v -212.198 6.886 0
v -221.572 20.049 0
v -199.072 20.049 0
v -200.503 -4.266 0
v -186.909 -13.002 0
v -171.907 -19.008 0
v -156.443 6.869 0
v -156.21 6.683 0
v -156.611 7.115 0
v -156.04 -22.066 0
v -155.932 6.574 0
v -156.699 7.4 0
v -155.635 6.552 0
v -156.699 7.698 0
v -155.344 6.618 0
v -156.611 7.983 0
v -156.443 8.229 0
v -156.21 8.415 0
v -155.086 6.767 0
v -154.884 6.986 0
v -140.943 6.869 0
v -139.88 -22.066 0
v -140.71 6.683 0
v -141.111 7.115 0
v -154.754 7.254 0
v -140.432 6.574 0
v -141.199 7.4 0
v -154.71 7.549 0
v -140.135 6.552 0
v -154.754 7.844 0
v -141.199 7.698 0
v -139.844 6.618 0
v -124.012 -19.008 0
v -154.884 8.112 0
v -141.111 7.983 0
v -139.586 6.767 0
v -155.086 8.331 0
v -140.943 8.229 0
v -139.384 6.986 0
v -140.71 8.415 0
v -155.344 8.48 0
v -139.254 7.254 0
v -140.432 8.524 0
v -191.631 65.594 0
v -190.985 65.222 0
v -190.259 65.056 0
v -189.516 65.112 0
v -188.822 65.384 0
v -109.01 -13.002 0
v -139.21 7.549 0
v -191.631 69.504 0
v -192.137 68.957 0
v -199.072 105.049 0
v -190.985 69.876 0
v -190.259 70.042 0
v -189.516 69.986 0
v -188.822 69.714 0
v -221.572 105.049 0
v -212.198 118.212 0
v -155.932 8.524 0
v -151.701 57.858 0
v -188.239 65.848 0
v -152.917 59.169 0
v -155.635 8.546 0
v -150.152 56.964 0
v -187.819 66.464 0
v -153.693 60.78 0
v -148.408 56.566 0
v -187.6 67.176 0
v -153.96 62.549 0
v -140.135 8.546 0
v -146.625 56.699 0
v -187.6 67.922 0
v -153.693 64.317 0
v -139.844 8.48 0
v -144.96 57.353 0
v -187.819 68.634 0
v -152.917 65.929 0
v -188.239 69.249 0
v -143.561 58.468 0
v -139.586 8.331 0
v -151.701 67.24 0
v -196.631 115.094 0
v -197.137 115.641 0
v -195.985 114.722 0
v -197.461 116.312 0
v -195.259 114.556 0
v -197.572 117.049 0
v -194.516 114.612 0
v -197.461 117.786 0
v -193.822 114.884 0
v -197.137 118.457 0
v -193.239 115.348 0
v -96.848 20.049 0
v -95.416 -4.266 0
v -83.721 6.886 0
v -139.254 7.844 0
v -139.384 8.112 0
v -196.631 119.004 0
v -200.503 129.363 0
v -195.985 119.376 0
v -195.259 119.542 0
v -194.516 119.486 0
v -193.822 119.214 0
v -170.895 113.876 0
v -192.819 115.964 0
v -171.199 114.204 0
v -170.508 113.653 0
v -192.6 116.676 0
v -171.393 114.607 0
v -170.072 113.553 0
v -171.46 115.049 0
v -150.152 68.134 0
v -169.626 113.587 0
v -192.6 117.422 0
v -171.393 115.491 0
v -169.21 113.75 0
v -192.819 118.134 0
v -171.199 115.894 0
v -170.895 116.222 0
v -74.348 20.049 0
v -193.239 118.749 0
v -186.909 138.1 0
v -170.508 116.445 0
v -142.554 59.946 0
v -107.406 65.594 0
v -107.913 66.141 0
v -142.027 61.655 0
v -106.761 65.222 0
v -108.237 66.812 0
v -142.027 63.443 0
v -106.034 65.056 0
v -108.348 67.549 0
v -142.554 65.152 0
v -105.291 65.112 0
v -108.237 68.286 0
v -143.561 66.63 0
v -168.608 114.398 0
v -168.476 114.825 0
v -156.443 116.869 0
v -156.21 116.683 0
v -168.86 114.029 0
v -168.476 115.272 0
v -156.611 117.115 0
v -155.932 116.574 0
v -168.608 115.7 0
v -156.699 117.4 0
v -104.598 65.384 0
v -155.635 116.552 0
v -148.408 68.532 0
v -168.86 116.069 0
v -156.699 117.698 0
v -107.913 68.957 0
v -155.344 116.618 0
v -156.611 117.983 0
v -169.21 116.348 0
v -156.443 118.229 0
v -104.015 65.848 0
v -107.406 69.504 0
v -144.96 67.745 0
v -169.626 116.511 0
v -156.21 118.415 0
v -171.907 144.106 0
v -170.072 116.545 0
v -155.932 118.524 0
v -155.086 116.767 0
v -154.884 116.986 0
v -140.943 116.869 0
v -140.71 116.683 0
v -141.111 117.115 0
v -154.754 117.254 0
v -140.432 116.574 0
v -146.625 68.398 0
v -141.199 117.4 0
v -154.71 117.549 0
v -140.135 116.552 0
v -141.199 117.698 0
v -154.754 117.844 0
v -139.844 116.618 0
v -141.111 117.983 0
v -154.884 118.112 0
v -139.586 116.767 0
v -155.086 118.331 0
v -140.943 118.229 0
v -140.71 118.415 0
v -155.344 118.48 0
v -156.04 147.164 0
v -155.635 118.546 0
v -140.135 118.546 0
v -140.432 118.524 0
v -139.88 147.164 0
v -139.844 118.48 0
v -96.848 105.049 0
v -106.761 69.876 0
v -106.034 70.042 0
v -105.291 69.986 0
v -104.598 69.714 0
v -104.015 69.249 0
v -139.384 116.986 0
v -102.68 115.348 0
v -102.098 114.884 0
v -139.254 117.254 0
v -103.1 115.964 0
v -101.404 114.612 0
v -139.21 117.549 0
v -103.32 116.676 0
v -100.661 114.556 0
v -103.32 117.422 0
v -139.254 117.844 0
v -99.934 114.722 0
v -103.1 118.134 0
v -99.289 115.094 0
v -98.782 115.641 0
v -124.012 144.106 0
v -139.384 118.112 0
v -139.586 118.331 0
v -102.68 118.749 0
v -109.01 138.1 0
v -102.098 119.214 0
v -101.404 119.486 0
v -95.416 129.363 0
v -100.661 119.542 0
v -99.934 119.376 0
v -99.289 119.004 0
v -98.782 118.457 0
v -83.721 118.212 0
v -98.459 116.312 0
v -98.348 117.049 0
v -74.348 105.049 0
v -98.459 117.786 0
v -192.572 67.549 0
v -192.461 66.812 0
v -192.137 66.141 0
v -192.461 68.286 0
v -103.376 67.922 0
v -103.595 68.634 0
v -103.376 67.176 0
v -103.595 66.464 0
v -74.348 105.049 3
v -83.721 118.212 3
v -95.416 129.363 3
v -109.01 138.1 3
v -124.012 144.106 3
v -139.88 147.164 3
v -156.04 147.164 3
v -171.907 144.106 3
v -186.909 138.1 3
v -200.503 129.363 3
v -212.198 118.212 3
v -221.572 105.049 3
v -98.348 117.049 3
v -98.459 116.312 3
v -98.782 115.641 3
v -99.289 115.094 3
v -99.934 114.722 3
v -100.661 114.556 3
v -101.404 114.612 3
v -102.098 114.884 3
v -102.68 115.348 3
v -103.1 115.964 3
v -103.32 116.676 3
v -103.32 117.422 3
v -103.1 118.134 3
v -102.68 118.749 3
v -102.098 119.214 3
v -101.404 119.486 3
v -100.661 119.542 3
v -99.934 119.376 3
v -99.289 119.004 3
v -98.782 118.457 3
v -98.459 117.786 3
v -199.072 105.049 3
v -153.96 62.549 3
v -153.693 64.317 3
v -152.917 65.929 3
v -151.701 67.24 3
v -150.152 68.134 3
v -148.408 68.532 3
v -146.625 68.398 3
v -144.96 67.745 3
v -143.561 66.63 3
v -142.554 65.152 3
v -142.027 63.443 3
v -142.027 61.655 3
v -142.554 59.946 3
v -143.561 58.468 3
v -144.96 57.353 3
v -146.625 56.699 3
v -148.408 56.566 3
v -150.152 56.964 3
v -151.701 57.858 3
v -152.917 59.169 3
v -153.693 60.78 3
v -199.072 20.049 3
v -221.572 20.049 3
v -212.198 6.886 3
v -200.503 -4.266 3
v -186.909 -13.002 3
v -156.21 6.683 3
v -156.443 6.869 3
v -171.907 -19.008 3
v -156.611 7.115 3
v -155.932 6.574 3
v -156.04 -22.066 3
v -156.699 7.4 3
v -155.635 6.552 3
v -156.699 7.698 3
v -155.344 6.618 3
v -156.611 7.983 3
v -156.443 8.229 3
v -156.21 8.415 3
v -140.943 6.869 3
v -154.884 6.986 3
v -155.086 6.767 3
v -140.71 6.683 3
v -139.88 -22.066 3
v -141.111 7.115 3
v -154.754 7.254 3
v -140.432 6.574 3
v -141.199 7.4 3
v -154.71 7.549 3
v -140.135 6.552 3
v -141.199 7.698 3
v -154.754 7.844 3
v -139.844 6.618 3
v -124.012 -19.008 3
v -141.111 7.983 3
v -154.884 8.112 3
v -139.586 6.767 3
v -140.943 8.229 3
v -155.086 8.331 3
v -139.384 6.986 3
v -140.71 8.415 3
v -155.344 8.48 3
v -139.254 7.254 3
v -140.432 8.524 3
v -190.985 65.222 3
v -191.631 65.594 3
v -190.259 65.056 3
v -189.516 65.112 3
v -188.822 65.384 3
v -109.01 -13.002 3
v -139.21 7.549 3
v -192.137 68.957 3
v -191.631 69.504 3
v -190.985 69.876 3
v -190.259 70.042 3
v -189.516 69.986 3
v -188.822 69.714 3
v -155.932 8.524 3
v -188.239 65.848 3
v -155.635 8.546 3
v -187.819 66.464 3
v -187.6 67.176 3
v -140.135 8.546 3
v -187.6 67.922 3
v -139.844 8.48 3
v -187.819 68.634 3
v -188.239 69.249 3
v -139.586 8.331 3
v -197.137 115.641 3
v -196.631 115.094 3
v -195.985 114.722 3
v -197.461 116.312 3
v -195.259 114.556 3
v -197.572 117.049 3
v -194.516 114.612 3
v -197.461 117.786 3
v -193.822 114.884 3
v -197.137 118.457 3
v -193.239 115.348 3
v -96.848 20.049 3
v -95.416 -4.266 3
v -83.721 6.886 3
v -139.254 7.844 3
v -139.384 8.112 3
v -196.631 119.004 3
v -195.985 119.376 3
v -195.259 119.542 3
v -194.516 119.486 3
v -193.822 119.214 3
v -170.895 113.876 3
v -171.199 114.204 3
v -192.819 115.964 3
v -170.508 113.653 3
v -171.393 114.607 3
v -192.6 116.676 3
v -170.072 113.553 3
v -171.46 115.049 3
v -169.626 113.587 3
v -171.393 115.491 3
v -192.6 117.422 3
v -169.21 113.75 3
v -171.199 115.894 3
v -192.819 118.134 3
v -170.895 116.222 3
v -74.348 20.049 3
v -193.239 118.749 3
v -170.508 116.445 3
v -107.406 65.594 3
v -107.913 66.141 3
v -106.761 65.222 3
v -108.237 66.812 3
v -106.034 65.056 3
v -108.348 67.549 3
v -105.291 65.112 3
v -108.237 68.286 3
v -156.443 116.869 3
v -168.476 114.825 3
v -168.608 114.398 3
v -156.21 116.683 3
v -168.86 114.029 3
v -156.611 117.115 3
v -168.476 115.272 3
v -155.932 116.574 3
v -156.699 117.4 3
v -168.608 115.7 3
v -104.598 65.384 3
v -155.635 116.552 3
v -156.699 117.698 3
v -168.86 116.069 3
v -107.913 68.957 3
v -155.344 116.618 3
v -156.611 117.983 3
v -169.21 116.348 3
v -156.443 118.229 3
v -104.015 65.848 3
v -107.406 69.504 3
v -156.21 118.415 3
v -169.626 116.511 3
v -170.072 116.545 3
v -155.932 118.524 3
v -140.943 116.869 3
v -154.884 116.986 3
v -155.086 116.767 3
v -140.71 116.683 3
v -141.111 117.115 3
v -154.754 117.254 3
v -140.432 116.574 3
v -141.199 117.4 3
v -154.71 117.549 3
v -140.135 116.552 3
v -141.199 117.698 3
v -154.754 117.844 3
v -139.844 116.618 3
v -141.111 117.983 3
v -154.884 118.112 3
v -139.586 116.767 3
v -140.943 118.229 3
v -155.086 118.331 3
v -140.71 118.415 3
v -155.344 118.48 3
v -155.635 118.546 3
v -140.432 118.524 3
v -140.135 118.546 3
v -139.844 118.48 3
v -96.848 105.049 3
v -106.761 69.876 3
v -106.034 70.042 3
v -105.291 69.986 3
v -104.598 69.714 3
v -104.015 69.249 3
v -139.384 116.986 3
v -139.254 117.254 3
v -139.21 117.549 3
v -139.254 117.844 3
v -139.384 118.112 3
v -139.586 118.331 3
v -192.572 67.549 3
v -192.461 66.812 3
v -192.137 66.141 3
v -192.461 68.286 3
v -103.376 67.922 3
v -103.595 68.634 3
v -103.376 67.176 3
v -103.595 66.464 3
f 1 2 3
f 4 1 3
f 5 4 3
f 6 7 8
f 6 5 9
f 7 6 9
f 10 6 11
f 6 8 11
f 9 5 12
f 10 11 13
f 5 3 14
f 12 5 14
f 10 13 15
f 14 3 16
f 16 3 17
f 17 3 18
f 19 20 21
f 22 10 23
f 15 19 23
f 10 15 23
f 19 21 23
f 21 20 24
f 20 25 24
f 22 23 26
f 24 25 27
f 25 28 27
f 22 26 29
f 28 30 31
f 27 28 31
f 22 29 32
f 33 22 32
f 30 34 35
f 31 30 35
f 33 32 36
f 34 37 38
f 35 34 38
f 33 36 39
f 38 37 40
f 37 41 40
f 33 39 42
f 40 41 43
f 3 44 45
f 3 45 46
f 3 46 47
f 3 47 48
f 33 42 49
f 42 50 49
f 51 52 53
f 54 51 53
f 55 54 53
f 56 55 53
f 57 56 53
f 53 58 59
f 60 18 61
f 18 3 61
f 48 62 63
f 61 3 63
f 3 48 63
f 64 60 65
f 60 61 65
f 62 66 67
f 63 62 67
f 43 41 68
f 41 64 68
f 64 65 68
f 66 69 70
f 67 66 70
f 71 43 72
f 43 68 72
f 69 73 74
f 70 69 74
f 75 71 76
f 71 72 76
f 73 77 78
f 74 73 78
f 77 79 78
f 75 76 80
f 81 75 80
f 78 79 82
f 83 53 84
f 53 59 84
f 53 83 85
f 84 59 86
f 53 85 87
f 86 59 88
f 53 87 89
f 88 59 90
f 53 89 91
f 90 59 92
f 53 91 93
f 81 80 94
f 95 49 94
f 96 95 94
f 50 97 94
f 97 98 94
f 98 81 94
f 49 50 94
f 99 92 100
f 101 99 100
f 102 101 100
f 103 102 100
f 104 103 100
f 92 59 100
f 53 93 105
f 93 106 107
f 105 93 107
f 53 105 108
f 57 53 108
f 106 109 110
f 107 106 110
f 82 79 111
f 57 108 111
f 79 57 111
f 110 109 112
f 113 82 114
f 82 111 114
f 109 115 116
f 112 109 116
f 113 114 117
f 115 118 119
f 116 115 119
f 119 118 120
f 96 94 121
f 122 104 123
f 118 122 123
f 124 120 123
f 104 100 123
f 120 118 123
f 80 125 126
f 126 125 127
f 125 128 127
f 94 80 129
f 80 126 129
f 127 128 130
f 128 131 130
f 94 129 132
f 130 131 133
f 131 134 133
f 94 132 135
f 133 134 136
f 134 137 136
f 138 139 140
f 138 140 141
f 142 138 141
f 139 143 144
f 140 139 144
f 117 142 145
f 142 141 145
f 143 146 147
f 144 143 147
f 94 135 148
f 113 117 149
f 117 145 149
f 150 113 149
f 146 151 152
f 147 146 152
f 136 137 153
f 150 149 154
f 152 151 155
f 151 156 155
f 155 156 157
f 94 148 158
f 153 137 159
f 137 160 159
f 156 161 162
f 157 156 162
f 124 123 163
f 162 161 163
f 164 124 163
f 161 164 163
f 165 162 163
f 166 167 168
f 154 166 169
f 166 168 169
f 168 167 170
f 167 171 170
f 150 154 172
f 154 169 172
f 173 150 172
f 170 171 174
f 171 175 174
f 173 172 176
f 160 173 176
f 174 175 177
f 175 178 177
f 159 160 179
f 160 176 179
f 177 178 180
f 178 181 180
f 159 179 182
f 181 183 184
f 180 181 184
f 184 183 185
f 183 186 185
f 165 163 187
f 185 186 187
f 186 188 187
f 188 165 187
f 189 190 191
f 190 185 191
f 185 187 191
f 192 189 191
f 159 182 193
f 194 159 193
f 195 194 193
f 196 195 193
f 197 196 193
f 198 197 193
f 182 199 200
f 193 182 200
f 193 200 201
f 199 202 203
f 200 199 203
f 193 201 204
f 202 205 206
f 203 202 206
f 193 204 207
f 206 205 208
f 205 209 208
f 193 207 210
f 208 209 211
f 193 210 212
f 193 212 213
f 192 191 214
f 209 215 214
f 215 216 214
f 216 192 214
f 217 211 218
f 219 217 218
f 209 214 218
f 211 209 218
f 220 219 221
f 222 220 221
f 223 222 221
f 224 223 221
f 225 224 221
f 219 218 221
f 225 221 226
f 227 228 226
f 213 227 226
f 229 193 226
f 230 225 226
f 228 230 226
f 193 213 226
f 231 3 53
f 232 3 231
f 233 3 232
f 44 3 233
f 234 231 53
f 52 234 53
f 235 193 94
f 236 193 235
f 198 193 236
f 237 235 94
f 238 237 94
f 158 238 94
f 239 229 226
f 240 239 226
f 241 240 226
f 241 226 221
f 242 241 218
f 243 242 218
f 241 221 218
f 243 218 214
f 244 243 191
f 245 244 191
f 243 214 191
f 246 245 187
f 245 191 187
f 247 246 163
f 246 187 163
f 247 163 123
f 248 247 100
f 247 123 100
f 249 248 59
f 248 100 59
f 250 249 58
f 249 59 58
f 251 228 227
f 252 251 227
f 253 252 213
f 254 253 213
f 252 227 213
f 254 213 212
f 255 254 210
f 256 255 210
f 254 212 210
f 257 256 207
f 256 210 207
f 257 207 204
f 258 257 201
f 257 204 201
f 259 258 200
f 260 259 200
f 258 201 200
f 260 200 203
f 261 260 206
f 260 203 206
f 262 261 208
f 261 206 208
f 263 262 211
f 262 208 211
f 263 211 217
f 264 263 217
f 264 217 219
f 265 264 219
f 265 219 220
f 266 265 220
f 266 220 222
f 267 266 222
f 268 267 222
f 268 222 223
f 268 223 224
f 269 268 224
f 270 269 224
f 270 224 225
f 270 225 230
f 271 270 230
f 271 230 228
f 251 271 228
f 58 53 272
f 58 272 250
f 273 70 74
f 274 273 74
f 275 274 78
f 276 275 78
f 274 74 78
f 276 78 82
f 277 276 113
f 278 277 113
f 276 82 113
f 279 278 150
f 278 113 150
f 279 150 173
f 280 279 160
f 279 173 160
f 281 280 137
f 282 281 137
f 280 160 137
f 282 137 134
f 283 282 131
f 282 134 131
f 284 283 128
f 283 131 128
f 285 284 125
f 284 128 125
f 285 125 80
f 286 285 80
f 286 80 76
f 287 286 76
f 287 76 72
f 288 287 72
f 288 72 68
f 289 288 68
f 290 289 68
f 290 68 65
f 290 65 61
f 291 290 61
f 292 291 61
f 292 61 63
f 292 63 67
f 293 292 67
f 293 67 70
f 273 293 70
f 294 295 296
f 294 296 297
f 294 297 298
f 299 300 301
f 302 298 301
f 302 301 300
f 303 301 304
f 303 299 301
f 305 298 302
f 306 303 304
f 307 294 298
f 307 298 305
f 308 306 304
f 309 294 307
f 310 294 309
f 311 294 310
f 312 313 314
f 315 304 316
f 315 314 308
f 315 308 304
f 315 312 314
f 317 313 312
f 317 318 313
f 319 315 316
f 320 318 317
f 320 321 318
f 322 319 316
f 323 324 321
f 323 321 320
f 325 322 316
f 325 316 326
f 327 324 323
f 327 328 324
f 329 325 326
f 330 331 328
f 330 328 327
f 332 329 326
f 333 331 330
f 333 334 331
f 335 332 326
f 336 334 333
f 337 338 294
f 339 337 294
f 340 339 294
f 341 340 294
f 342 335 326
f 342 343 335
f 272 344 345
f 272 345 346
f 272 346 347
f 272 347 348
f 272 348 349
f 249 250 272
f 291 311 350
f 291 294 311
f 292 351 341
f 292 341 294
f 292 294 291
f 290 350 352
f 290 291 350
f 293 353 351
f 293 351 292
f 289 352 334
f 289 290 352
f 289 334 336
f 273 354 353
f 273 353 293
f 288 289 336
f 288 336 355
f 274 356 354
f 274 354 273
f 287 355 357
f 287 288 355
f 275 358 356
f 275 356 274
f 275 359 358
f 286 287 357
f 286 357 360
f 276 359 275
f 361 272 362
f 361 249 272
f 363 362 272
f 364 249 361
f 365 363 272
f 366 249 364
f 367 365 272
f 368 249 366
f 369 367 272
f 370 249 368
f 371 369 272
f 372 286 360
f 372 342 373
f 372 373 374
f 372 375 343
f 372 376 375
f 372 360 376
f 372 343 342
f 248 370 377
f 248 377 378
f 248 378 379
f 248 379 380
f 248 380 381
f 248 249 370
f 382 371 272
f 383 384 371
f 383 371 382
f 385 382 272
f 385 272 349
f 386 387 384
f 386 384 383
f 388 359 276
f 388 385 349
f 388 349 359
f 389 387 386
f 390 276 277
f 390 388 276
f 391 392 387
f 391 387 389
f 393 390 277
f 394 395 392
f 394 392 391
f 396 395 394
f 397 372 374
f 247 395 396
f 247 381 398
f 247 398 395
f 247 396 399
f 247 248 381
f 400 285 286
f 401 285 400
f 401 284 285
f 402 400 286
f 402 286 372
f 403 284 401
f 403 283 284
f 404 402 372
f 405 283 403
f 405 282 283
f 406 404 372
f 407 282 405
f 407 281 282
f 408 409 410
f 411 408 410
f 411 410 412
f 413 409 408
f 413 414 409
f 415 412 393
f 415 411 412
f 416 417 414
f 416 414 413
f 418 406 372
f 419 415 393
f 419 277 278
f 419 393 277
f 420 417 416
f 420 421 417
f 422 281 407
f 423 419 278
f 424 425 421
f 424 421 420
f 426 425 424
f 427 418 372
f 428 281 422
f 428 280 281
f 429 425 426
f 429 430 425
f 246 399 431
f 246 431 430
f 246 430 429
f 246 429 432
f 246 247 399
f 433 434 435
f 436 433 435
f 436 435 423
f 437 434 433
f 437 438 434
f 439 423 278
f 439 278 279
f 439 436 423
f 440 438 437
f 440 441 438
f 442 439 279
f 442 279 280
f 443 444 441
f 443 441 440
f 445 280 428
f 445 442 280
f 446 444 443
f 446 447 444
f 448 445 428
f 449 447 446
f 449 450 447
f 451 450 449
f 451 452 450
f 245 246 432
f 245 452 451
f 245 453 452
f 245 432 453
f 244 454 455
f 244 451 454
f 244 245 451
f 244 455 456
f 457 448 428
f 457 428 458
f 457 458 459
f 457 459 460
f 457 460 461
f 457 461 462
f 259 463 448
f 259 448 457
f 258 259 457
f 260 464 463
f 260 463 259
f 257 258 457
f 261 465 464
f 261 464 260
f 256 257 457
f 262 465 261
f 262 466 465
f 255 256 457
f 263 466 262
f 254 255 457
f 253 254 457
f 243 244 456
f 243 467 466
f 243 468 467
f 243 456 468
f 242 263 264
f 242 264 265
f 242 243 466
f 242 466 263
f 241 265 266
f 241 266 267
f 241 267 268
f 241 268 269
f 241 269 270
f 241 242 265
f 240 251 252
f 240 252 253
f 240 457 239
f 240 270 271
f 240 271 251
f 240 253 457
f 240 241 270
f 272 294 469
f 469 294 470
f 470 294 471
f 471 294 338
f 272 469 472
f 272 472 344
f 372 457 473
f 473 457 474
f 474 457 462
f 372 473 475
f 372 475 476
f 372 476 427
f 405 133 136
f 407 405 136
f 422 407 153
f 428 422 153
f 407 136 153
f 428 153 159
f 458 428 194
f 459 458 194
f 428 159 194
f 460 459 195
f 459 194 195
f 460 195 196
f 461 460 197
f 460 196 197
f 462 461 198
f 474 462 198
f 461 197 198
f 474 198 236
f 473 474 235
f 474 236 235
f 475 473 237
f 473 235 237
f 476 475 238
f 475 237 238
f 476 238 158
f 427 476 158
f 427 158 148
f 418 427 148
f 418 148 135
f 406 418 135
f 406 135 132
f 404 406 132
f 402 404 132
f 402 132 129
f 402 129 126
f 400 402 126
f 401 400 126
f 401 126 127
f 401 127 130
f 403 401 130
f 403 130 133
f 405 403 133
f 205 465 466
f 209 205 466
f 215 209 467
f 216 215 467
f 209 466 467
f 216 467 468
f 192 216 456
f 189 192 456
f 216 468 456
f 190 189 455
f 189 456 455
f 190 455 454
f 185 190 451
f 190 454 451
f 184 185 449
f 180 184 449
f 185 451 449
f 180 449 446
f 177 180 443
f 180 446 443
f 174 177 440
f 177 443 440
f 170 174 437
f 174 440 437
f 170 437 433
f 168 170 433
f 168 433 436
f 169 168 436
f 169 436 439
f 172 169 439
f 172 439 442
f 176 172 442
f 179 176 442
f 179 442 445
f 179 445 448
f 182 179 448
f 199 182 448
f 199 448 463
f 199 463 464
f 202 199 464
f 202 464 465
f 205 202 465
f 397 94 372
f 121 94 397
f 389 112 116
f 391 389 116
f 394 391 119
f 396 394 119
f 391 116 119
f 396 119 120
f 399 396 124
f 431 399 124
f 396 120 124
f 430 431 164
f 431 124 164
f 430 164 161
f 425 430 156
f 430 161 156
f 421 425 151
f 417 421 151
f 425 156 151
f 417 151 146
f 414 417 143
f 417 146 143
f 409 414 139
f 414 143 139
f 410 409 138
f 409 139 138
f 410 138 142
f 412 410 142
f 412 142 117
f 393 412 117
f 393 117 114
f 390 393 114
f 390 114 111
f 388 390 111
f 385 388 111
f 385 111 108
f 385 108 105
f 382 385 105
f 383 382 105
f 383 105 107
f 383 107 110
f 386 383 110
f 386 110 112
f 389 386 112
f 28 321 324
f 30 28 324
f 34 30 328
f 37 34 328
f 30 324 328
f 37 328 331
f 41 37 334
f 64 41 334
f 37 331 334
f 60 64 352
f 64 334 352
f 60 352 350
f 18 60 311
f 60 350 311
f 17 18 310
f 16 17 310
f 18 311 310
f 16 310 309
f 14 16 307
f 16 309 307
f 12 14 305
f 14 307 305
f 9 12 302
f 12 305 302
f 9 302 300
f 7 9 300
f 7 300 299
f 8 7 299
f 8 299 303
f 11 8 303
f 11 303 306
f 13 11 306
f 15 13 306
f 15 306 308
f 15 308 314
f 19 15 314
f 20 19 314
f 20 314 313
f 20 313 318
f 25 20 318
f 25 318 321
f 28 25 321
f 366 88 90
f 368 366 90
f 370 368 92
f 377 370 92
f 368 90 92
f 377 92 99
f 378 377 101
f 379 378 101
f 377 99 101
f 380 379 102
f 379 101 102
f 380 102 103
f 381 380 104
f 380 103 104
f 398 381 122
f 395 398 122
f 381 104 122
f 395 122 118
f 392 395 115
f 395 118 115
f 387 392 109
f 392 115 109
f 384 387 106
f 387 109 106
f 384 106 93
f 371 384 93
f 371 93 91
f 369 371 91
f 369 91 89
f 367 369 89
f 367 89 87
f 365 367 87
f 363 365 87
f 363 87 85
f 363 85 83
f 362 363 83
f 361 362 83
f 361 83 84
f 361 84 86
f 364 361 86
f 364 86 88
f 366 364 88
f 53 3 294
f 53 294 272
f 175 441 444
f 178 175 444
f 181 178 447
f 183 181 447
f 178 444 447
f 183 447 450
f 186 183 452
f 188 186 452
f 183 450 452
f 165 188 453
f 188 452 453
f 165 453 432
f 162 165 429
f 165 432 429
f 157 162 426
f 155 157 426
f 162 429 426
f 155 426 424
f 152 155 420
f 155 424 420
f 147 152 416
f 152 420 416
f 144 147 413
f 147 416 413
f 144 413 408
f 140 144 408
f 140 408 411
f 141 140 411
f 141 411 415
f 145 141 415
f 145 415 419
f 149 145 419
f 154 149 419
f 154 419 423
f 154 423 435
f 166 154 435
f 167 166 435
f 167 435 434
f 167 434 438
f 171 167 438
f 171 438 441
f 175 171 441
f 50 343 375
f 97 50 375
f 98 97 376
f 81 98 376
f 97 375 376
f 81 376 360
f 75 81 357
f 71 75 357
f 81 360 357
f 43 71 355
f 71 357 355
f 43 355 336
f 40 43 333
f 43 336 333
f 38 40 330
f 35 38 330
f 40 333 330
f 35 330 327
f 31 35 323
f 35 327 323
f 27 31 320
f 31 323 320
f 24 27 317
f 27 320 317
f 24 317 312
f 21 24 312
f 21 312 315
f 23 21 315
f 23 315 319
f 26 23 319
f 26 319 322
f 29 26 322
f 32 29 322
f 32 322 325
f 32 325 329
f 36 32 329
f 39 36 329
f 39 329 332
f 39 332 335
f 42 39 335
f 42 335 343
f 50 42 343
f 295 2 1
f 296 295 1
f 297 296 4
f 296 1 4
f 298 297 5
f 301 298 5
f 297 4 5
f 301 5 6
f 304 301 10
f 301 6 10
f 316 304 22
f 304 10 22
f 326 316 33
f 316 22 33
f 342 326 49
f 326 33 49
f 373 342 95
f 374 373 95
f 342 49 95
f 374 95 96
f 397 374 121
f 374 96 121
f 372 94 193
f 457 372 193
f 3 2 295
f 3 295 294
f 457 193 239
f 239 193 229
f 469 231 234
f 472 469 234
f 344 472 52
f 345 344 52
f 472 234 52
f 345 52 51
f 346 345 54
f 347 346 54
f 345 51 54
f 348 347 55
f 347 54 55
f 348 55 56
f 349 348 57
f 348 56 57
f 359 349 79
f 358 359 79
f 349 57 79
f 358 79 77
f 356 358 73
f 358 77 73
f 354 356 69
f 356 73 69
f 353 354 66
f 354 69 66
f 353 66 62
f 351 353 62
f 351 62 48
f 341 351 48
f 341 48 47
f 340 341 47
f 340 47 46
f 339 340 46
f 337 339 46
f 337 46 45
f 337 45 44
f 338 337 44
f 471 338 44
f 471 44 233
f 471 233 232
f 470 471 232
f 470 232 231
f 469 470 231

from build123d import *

# Parameters (mm, degrees)
ESQUISSE1_R              = 85
BOSS_EXTRU_1_DEPTH       = 3
ESQUISSE2_W              = 32.5
ESQUISSE2_H              = 85
ENL_V_MAT_EXTRU_6_DEPTH  = 3
ESQUISSE3_R              = 1
ENL_V_MAT_EXTRU_8_DEPTH  = 10
ESQUISSE53_R             = 2.5
ENL_V_MAT_EXTRU_21_DEPTH = 10
ESQUISSE54_R             = 2.5
ENL_V_MAT_EXTRU_22_DEPTH = 10
ESQUISSE55_R             = 1.5
ENL_V_MAT_EXTRU_23_DEPTH = 10
ESQUISSE56_R             = 6
ENL_V_MAT_EXTRU_24_DEPTH = 10


with BuildPart() as part:
    # Esquisse1 → Boss.-Extru.1 (new body)
    with BuildSketch(Plane.XY):
        with Locations((-147.95974357, 62.548931244)):
            Circle(ESQUISSE1_R)
    extrude(amount=BOSS_EXTRU_1_DEPTH)

    # Esquisse2 → Enlèv. mat.-Extru.6 (cut)
    with BuildSketch(Plane.XY):
        with BuildLine():
            Line((-199.071902892, 105.048931244), (-221.571902892, 105.048931244))
            ThreePointArc((-221.571902892, 105.048931244), (-227.739869981, 91.876928617), (-231.571902892, 77.846212492))
            Line((-231.571902892, 77.846212492), (-231.571902892, 47.251649997))
            ThreePointArc((-231.571902892, 47.251649997), (-227.739869981, 33.220933871), (-221.571902892, 20.048931244))
            Line((-221.571902892, 20.048931244), (-199.071902892, 20.048931244))
            Line((-199.071902892, 20.048931244), (-199.071902892, 105.048931244))
        make_face()
        with Locations((-80.597584249, 62.548931244)):
            Rectangle(ESQUISSE2_W, ESQUISSE2_H)
    extrude(amount=ENL_V_MAT_EXTRU_6_DEPTH, mode=Mode.SUBTRACT)


with BuildPart() as enl_v_mat_extru_6_piece_1:
    # of the separate pieces the step leaves, piece 1, a body of its own (enl_v_mat_extru_6_pieces)
    add(part.part.solids().sort_by_distance((-74.347584249, 105.048931244, 0))[0])

    # Esquisse3 → Enlèv. mat.-Extru.8 (cut)
    with BuildSketch(Plane.XY.offset(3)):
        with Locations((-155.70974357, 117.548931244)):
            Circle(ESQUISSE3_R)
        with Locations((-140.20974357, 117.548931244)):
            Circle(ESQUISSE3_R)
        with Locations((-140.20974357, 7.548931244)):
            Circle(ESQUISSE3_R)
        with Locations((-155.70974357, 7.548931244)):
            Circle(ESQUISSE3_R)
    extrude(amount=-ENL_V_MAT_EXTRU_8_DEPTH, mode=Mode.SUBTRACT)

    # Esquisse53 → Enlèv. mat.-Extru.21 (cut)
    with BuildSketch(Plane(origin=(0, 0, 0), x_dir=(-1, 0, 0), z_dir=(0, 0, -1))):
        with Locations((190.071902892, 67.548931244)):
            Circle(ESQUISSE53_R)
        with Locations((105.847584249, 67.548931244)):
            Circle(ESQUISSE53_R)
    extrude(amount=-ENL_V_MAT_EXTRU_21_DEPTH, mode=Mode.SUBTRACT)

    # Esquisse54 → Enlèv. mat.-Extru.22 (cut)
    with BuildSketch(Plane(origin=(0, 0, 0), x_dir=(-1, 0, 0), z_dir=(0, 0, -1))):
        with Locations((195.071902892, 117.048931244)):
            Circle(ESQUISSE54_R)
        with Locations(Location((100.847584249, 117.048931244, 0), (0, 0, 180))):
            Circle(ESQUISSE54_R)
    extrude(amount=-ENL_V_MAT_EXTRU_22_DEPTH, mode=Mode.SUBTRACT)

    # Esquisse55 → Enlèv. mat.-Extru.23 (cut)
    with BuildSketch(Plane(origin=(0, 0, 0), x_dir=(-1, 0, 0), z_dir=(0, 0, -1))):
        with Locations((169.95974357, 115.048931244)):
            Circle(ESQUISSE55_R)
    extrude(amount=-ENL_V_MAT_EXTRU_23_DEPTH, mode=Mode.SUBTRACT)

    # Esquisse56 → Enlèv. mat.-Extru.24 (cut)
    with BuildSketch(Plane(origin=(0, 0, 0), x_dir=(-1, 0, 0), z_dir=(0, 0, -1))):
        with Locations((147.95974357, 62.548931244)):
            Circle(ESQUISSE56_R)
    extrude(amount=-ENL_V_MAT_EXTRU_24_DEPTH, mode=Mode.SUBTRACT)


with BuildPart() as enl_v_mat_extru_6_piece_2:
    # of the separate pieces the step leaves, piece 2, a body of its own (enl_v_mat_extru_6_pieces)
    add(part.part.solids().sort_by_distance((-64.347584249, 47.251649997, 0))[0])


with BuildPart() as enl_v_mat_extru_6_piece_3:
    # of the separate pieces the step leaves, piece 3, a body of its own (enl_v_mat_extru_6_pieces)
    add(part.part.solids().sort_by_distance((-231.571902892, 77.846212492, 0))[0])


solid = enl_v_mat_extru_6_piece_1.part
